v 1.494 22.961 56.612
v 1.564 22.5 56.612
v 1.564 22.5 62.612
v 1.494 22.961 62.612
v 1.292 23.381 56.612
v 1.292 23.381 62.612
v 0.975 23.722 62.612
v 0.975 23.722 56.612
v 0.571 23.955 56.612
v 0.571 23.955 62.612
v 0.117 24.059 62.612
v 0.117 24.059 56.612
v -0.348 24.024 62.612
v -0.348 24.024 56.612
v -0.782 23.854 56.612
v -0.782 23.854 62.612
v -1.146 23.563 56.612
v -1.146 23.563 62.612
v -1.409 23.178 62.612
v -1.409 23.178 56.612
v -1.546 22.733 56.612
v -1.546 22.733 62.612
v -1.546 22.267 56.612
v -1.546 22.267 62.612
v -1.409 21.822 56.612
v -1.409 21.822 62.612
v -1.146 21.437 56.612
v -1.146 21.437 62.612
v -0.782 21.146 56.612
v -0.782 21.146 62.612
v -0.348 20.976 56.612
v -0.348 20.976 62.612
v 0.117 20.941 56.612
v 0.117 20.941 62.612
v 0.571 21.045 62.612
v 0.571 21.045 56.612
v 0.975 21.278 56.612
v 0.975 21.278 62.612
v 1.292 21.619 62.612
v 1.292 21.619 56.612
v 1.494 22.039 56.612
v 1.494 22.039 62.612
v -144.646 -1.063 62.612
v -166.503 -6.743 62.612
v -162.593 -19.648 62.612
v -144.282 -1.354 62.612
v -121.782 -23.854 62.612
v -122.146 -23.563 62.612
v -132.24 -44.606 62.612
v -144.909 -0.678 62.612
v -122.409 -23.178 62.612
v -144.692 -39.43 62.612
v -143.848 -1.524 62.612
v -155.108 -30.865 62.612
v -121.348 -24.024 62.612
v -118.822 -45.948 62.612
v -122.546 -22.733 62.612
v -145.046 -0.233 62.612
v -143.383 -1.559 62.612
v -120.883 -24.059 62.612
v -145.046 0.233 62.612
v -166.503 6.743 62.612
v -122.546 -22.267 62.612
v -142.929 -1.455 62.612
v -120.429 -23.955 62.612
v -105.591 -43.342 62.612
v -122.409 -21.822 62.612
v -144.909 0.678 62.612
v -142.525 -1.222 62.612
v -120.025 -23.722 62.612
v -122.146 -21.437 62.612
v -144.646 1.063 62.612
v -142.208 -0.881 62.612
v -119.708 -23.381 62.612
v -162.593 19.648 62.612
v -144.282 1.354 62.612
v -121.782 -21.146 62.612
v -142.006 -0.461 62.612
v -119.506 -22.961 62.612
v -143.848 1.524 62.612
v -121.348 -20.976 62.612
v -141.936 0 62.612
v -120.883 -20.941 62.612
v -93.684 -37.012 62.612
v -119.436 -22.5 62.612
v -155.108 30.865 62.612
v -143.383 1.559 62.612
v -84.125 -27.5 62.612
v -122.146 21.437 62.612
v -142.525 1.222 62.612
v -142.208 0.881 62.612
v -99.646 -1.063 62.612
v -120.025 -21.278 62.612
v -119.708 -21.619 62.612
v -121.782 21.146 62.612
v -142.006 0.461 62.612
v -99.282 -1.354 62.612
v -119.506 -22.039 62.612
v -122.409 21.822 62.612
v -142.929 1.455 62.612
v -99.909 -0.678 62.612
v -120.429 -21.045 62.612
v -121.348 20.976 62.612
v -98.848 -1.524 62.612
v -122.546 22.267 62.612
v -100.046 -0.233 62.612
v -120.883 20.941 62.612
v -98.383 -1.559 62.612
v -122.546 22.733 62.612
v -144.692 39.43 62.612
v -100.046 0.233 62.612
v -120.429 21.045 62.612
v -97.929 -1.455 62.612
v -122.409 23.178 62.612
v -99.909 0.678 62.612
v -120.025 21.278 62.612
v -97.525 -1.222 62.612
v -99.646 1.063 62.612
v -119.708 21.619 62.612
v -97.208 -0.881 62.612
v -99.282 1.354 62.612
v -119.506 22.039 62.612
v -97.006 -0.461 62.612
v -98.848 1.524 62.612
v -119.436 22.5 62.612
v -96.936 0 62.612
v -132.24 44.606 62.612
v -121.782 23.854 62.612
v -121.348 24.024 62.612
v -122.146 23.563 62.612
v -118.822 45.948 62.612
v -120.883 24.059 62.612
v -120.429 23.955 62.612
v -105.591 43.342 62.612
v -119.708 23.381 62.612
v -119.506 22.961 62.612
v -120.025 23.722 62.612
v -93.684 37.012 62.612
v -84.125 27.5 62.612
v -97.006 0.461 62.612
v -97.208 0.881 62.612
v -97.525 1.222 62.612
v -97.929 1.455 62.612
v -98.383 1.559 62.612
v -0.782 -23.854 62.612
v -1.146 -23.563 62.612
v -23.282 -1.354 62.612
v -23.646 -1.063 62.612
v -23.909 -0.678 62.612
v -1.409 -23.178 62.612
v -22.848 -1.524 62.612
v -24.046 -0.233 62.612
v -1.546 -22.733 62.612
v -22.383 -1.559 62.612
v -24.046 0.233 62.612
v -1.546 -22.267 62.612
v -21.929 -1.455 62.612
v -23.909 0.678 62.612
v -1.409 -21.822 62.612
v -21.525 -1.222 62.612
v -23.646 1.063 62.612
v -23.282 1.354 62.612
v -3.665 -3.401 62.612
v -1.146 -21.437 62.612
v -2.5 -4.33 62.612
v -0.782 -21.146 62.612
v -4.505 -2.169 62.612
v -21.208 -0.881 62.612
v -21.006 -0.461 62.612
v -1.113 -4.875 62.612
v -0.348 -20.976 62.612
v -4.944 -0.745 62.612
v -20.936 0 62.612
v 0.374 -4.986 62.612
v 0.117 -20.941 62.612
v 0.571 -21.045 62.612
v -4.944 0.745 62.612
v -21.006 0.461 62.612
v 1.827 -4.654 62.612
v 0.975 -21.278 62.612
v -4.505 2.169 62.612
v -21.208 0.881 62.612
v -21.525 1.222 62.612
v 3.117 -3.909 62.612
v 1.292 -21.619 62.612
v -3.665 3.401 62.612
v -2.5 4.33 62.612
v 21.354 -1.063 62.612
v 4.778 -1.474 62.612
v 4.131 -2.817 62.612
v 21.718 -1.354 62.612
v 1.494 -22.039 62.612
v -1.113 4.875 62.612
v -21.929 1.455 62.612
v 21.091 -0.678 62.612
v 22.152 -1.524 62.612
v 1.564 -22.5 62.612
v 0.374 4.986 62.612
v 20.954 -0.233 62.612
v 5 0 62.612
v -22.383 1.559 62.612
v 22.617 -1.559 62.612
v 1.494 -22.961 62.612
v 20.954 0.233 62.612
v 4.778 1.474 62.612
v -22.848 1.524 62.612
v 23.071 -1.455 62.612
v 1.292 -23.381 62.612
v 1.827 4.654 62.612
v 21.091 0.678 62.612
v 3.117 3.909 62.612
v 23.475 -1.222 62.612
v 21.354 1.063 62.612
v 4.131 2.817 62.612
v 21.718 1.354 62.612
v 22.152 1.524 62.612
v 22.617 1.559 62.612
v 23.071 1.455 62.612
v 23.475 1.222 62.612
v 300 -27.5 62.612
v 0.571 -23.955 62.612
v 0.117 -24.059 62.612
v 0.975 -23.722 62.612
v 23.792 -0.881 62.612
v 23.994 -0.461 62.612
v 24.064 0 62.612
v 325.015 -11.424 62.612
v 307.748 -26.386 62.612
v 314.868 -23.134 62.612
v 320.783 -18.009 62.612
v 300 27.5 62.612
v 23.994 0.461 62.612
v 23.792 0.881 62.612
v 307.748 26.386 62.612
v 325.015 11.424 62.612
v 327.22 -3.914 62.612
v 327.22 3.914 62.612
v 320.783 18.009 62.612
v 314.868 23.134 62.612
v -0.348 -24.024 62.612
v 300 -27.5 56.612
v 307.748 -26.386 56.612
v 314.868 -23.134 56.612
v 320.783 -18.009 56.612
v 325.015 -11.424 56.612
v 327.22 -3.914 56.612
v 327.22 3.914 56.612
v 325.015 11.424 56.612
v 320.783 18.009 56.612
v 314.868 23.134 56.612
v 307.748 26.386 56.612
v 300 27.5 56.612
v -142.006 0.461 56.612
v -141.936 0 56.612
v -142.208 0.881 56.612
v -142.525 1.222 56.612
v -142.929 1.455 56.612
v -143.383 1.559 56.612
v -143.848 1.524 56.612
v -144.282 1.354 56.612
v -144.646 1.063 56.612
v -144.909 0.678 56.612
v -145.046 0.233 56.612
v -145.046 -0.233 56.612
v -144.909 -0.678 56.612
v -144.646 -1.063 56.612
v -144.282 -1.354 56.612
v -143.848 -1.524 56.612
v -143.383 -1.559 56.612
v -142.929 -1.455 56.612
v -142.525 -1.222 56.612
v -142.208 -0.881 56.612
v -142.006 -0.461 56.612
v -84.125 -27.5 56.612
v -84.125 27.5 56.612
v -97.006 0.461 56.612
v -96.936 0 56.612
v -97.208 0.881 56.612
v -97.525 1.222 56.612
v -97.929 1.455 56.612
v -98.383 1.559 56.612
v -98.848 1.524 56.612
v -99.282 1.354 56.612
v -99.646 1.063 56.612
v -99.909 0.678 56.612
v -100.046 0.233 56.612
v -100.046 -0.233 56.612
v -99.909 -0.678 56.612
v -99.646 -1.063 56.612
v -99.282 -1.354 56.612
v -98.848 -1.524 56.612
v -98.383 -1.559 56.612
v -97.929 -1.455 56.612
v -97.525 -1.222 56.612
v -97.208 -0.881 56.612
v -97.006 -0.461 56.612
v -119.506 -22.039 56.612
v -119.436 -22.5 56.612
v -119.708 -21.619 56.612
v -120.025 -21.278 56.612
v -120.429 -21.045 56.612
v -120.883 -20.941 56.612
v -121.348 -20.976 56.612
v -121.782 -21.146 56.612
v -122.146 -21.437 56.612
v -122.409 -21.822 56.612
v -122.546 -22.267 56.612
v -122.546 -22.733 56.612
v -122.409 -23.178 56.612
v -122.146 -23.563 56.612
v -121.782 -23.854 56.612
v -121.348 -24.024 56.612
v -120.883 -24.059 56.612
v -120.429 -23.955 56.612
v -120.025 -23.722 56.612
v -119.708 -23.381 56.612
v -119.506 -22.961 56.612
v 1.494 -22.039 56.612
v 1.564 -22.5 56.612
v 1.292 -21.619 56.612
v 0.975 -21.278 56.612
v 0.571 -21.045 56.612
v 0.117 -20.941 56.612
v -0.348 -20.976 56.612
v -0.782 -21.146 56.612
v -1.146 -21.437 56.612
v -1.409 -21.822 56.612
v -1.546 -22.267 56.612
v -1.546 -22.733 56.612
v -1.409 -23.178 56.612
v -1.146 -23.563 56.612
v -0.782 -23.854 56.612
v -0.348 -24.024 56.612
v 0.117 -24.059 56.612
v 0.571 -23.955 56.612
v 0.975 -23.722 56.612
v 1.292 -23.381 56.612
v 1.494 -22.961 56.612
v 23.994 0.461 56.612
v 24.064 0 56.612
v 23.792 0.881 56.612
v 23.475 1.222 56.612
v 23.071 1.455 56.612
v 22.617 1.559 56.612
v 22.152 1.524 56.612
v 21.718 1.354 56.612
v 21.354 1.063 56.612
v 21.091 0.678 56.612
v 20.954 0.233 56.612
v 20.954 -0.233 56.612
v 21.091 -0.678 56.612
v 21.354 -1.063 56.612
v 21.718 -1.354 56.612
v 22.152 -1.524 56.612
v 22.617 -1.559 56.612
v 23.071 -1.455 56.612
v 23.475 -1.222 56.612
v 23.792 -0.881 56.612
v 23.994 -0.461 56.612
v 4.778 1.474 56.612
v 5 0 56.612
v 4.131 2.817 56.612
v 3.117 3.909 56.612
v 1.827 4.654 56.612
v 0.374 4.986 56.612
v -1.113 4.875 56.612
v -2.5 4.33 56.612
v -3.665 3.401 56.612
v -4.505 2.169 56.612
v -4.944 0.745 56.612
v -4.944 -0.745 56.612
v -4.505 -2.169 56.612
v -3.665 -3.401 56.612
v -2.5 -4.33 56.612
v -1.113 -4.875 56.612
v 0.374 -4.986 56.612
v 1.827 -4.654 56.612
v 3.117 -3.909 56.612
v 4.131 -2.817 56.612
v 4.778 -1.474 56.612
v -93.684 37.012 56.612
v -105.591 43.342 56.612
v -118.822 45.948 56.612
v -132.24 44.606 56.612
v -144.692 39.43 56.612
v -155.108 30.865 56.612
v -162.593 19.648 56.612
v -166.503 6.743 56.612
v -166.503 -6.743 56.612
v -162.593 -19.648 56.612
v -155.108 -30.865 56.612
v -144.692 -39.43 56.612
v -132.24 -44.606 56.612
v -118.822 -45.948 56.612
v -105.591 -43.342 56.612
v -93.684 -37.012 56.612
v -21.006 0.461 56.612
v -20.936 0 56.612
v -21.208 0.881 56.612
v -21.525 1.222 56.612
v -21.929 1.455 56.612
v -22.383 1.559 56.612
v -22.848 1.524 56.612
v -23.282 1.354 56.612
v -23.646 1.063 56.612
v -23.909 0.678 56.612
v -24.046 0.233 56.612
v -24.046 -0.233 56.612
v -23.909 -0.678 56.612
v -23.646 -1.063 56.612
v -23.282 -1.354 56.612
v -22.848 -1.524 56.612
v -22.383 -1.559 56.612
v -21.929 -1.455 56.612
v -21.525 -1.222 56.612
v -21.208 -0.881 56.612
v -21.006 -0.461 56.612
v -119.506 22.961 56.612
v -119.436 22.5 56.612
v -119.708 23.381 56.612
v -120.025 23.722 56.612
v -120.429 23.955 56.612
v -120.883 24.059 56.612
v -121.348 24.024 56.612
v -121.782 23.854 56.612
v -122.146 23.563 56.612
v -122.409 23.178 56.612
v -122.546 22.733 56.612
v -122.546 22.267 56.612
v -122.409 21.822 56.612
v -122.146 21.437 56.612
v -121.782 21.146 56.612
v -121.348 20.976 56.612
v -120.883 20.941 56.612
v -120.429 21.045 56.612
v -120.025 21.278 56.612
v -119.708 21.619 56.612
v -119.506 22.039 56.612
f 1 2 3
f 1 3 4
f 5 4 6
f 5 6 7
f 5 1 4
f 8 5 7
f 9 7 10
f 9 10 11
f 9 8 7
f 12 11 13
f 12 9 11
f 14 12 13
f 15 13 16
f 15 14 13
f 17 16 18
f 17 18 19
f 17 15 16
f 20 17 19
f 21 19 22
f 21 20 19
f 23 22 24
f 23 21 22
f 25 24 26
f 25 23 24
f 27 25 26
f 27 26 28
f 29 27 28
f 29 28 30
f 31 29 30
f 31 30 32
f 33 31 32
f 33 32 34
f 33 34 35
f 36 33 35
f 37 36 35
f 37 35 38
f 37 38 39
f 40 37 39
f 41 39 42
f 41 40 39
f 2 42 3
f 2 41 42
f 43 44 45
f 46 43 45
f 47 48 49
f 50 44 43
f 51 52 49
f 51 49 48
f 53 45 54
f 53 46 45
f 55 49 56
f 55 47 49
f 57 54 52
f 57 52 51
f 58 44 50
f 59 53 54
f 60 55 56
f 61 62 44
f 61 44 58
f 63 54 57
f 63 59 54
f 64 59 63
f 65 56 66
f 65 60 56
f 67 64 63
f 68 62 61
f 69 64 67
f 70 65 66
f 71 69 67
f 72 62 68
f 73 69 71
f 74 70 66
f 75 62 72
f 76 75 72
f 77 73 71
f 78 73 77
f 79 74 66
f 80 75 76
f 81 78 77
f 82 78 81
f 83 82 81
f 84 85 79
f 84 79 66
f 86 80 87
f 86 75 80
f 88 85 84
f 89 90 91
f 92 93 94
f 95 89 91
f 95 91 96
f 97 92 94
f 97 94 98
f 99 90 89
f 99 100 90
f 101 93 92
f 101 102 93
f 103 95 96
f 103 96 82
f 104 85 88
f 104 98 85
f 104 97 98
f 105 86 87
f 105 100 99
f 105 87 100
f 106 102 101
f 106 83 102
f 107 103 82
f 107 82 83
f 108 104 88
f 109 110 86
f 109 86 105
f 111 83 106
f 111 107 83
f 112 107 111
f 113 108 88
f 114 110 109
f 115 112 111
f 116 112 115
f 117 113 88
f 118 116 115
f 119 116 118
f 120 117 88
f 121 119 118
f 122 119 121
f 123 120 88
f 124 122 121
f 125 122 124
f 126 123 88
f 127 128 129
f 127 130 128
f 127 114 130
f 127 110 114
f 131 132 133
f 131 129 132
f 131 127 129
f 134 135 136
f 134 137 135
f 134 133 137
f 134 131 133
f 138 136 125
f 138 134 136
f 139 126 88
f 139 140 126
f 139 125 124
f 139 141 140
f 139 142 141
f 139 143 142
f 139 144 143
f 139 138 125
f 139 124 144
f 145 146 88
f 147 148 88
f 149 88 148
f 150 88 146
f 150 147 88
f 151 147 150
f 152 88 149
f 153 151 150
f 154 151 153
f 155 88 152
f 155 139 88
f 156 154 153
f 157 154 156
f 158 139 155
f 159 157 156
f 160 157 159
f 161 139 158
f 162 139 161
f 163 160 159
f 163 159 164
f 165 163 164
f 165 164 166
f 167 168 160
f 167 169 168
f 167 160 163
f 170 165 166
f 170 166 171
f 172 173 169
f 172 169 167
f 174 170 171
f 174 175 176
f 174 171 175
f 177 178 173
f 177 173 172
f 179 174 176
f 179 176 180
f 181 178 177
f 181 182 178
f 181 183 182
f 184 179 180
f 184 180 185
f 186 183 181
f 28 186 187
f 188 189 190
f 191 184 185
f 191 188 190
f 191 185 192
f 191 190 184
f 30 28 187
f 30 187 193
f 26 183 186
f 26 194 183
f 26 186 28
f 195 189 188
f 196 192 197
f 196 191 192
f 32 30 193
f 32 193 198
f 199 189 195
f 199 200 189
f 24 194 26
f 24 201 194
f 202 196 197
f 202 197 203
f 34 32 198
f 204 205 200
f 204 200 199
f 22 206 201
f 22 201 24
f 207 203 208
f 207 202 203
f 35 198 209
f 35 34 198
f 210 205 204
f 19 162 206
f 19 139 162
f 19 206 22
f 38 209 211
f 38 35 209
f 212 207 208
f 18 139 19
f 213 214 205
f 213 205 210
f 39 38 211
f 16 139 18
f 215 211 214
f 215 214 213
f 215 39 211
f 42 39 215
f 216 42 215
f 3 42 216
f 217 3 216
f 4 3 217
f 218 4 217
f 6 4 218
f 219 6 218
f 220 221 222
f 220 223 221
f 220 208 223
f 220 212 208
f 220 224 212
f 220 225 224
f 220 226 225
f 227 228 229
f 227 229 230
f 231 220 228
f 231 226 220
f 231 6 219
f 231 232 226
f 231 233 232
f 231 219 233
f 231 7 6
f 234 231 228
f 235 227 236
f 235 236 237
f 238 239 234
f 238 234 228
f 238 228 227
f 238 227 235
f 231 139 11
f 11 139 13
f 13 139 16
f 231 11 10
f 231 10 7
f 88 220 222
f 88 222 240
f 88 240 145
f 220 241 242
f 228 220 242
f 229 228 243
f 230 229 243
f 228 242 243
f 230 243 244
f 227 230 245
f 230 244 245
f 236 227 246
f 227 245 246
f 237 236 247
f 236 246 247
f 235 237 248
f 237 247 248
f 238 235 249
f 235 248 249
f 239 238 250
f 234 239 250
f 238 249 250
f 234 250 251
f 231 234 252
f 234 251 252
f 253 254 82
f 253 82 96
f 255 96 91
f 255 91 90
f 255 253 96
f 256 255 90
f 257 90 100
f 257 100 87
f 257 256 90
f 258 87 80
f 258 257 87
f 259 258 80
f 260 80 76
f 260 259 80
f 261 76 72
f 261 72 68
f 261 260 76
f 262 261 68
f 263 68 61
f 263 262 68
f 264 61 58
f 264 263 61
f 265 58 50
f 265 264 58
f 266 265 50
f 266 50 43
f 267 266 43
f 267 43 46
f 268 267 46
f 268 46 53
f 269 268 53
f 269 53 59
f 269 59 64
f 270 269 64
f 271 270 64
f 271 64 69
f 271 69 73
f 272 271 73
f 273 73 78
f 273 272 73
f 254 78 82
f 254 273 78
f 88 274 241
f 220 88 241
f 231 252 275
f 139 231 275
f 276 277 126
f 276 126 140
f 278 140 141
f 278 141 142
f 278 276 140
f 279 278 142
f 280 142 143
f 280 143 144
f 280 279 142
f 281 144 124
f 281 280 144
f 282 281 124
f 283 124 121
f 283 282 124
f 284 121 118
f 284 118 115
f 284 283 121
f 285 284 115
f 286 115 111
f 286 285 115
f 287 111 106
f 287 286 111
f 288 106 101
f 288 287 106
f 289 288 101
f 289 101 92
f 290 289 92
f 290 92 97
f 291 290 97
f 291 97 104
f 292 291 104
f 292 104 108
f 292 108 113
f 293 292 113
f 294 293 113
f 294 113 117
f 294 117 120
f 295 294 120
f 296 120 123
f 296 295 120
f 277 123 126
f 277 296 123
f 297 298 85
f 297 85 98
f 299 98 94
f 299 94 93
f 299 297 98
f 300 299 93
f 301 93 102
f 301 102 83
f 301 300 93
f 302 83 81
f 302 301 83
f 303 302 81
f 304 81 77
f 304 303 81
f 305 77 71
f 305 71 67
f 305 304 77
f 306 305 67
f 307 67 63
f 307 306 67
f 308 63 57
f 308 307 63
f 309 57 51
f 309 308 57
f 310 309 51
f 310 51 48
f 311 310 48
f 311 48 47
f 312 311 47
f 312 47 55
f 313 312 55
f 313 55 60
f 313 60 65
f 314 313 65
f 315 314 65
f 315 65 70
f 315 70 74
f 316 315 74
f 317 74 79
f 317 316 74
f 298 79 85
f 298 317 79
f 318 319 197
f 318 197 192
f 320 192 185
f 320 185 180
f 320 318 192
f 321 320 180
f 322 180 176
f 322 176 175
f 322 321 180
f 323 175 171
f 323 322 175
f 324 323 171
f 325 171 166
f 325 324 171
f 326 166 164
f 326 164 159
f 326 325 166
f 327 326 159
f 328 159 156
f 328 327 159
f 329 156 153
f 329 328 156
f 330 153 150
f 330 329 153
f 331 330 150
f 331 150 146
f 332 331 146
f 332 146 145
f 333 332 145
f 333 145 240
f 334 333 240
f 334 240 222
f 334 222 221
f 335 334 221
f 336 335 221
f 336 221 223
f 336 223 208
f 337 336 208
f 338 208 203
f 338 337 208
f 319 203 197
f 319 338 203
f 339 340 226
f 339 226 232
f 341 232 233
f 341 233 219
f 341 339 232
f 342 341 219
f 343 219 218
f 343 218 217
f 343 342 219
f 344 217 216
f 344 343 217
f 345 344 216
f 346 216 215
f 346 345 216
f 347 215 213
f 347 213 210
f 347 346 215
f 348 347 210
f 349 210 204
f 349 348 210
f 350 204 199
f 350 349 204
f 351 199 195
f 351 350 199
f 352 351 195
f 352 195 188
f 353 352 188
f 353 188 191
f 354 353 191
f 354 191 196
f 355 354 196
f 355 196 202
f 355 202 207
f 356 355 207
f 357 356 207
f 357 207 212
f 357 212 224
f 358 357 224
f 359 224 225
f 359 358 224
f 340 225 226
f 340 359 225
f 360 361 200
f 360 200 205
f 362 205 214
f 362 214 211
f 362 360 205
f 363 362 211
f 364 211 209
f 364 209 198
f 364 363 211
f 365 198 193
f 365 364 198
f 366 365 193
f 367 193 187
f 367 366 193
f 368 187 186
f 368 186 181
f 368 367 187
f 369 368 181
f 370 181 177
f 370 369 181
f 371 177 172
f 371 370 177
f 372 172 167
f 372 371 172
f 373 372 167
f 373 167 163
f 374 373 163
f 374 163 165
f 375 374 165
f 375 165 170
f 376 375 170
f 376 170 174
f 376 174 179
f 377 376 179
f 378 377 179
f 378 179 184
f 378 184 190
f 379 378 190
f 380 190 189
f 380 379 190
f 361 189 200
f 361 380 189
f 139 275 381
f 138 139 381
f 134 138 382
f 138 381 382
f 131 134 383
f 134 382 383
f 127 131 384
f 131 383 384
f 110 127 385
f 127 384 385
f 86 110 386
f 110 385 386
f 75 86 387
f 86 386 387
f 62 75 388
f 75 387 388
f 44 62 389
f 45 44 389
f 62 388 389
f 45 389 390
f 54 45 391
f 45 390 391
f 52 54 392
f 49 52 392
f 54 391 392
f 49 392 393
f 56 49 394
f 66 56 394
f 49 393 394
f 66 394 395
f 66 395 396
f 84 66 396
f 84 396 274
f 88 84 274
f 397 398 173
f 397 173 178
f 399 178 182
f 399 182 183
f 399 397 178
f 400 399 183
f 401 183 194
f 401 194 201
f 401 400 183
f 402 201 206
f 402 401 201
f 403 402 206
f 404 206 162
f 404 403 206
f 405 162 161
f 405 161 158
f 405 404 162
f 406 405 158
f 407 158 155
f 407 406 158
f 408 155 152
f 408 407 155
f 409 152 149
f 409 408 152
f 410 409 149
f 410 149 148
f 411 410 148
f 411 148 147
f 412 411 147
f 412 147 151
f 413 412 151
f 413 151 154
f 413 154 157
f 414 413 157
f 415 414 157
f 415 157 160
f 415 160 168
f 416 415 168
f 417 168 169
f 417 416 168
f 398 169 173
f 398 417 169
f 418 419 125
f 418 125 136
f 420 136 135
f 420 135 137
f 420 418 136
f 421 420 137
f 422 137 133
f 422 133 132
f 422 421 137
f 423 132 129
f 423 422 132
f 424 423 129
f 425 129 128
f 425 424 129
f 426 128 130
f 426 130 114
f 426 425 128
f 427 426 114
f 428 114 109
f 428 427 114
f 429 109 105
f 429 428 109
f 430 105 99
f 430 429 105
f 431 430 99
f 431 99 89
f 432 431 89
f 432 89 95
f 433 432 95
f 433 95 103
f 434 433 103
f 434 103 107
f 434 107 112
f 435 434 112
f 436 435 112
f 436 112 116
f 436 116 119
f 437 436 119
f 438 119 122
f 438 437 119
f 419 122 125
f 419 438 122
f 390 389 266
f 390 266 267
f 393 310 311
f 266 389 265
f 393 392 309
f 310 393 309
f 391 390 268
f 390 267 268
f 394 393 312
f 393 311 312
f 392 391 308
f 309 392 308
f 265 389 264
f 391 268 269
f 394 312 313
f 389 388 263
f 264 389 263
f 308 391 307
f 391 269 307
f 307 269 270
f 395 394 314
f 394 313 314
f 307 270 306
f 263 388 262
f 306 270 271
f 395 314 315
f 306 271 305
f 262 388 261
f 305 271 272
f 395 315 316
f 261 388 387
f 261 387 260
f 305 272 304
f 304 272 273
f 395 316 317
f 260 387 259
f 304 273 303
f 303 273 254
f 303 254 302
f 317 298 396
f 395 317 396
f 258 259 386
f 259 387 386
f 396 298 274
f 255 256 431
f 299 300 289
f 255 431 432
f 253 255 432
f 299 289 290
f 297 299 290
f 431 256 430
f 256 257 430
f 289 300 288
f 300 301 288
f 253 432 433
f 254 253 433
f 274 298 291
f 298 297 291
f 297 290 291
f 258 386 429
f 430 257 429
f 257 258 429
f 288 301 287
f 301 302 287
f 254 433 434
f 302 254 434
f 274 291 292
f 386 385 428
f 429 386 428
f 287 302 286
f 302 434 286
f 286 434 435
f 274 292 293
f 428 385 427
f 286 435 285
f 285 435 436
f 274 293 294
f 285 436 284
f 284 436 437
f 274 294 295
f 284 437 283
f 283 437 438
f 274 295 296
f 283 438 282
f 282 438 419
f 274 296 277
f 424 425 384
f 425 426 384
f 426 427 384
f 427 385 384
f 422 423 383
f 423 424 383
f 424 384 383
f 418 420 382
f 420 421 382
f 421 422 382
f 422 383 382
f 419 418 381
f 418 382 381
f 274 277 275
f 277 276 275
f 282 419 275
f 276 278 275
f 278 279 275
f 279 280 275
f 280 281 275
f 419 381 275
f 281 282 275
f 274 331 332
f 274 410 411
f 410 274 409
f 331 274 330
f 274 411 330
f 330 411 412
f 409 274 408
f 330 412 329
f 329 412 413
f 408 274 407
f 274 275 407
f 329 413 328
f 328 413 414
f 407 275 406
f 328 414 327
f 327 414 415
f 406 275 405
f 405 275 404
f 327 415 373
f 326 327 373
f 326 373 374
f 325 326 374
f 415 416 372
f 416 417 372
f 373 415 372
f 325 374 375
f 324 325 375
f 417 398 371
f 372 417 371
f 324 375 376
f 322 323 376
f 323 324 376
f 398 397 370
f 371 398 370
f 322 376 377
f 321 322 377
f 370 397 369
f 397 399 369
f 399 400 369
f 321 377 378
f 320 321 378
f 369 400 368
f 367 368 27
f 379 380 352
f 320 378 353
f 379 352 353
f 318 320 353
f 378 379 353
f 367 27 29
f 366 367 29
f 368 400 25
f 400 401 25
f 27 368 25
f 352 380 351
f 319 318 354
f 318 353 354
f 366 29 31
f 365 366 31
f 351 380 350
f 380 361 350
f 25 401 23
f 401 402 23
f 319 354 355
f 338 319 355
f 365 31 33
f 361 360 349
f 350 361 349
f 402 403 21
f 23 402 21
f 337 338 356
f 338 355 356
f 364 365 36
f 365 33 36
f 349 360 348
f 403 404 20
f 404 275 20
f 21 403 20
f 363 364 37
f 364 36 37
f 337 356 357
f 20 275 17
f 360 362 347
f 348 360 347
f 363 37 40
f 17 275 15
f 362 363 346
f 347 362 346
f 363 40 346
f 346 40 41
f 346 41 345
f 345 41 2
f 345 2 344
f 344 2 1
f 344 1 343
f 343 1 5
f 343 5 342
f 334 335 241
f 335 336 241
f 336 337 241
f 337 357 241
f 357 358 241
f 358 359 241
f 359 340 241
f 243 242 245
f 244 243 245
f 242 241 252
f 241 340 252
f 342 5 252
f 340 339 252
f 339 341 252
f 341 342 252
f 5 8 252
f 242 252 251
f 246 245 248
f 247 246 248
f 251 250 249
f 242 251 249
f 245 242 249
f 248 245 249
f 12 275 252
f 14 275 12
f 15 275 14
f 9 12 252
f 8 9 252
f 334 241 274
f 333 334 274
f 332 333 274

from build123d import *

# Parameters (mm, degrees)
BOSS_EXTRUDE1_START = 56.6115
SKETCH2_R           = 1.5635
SKETCH2_R_2         = 5
BOSS_EXTRUDE1_DEPTH = 6


with BuildPart() as part:
    # Sketch2 → Boss-Extrude1 (new body)
    with BuildSketch(Plane.XY.offset(BOSS_EXTRUDE1_START)):
        with BuildLine():
            Line((300, 27.5), (-84.125211865, 27.5))
            ThreePointArc((-84.125211865, 27.5), (-167, 0), (-84.125211865, -27.5))
            Line((-84.125211865, -27.5), (300, -27.5))
            ThreePointArc((300, -27.5), (327.5, 0), (300, 27.5))
        make_face()
        with Locations((0, 22.5)):
            Circle(SKETCH2_R, mode=Mode.SUBTRACT)
        with Locations((22.5, 0)):
            Circle(SKETCH2_R, mode=Mode.SUBTRACT)
        with Locations((0, -22.5)):
            Circle(SKETCH2_R, mode=Mode.SUBTRACT)
        with Locations((-22.5, 0)):
            Circle(SKETCH2_R, mode=Mode.SUBTRACT)
        with Locations((-121, -22.5)):
            Circle(SKETCH2_R, mode=Mode.SUBTRACT)
        with Locations((-143.5, 0)):
            Circle(SKETCH2_R, mode=Mode.SUBTRACT)
        with Locations((-121, 22.5)):
            Circle(SKETCH2_R, mode=Mode.SUBTRACT)
        with Locations((-98.5, 0)):
            Circle(SKETCH2_R, mode=Mode.SUBTRACT)
        Circle(SKETCH2_R_2, mode=Mode.SUBTRACT)
    extrude(amount=BOSS_EXTRUDE1_DEPTH)


solid = part.part
